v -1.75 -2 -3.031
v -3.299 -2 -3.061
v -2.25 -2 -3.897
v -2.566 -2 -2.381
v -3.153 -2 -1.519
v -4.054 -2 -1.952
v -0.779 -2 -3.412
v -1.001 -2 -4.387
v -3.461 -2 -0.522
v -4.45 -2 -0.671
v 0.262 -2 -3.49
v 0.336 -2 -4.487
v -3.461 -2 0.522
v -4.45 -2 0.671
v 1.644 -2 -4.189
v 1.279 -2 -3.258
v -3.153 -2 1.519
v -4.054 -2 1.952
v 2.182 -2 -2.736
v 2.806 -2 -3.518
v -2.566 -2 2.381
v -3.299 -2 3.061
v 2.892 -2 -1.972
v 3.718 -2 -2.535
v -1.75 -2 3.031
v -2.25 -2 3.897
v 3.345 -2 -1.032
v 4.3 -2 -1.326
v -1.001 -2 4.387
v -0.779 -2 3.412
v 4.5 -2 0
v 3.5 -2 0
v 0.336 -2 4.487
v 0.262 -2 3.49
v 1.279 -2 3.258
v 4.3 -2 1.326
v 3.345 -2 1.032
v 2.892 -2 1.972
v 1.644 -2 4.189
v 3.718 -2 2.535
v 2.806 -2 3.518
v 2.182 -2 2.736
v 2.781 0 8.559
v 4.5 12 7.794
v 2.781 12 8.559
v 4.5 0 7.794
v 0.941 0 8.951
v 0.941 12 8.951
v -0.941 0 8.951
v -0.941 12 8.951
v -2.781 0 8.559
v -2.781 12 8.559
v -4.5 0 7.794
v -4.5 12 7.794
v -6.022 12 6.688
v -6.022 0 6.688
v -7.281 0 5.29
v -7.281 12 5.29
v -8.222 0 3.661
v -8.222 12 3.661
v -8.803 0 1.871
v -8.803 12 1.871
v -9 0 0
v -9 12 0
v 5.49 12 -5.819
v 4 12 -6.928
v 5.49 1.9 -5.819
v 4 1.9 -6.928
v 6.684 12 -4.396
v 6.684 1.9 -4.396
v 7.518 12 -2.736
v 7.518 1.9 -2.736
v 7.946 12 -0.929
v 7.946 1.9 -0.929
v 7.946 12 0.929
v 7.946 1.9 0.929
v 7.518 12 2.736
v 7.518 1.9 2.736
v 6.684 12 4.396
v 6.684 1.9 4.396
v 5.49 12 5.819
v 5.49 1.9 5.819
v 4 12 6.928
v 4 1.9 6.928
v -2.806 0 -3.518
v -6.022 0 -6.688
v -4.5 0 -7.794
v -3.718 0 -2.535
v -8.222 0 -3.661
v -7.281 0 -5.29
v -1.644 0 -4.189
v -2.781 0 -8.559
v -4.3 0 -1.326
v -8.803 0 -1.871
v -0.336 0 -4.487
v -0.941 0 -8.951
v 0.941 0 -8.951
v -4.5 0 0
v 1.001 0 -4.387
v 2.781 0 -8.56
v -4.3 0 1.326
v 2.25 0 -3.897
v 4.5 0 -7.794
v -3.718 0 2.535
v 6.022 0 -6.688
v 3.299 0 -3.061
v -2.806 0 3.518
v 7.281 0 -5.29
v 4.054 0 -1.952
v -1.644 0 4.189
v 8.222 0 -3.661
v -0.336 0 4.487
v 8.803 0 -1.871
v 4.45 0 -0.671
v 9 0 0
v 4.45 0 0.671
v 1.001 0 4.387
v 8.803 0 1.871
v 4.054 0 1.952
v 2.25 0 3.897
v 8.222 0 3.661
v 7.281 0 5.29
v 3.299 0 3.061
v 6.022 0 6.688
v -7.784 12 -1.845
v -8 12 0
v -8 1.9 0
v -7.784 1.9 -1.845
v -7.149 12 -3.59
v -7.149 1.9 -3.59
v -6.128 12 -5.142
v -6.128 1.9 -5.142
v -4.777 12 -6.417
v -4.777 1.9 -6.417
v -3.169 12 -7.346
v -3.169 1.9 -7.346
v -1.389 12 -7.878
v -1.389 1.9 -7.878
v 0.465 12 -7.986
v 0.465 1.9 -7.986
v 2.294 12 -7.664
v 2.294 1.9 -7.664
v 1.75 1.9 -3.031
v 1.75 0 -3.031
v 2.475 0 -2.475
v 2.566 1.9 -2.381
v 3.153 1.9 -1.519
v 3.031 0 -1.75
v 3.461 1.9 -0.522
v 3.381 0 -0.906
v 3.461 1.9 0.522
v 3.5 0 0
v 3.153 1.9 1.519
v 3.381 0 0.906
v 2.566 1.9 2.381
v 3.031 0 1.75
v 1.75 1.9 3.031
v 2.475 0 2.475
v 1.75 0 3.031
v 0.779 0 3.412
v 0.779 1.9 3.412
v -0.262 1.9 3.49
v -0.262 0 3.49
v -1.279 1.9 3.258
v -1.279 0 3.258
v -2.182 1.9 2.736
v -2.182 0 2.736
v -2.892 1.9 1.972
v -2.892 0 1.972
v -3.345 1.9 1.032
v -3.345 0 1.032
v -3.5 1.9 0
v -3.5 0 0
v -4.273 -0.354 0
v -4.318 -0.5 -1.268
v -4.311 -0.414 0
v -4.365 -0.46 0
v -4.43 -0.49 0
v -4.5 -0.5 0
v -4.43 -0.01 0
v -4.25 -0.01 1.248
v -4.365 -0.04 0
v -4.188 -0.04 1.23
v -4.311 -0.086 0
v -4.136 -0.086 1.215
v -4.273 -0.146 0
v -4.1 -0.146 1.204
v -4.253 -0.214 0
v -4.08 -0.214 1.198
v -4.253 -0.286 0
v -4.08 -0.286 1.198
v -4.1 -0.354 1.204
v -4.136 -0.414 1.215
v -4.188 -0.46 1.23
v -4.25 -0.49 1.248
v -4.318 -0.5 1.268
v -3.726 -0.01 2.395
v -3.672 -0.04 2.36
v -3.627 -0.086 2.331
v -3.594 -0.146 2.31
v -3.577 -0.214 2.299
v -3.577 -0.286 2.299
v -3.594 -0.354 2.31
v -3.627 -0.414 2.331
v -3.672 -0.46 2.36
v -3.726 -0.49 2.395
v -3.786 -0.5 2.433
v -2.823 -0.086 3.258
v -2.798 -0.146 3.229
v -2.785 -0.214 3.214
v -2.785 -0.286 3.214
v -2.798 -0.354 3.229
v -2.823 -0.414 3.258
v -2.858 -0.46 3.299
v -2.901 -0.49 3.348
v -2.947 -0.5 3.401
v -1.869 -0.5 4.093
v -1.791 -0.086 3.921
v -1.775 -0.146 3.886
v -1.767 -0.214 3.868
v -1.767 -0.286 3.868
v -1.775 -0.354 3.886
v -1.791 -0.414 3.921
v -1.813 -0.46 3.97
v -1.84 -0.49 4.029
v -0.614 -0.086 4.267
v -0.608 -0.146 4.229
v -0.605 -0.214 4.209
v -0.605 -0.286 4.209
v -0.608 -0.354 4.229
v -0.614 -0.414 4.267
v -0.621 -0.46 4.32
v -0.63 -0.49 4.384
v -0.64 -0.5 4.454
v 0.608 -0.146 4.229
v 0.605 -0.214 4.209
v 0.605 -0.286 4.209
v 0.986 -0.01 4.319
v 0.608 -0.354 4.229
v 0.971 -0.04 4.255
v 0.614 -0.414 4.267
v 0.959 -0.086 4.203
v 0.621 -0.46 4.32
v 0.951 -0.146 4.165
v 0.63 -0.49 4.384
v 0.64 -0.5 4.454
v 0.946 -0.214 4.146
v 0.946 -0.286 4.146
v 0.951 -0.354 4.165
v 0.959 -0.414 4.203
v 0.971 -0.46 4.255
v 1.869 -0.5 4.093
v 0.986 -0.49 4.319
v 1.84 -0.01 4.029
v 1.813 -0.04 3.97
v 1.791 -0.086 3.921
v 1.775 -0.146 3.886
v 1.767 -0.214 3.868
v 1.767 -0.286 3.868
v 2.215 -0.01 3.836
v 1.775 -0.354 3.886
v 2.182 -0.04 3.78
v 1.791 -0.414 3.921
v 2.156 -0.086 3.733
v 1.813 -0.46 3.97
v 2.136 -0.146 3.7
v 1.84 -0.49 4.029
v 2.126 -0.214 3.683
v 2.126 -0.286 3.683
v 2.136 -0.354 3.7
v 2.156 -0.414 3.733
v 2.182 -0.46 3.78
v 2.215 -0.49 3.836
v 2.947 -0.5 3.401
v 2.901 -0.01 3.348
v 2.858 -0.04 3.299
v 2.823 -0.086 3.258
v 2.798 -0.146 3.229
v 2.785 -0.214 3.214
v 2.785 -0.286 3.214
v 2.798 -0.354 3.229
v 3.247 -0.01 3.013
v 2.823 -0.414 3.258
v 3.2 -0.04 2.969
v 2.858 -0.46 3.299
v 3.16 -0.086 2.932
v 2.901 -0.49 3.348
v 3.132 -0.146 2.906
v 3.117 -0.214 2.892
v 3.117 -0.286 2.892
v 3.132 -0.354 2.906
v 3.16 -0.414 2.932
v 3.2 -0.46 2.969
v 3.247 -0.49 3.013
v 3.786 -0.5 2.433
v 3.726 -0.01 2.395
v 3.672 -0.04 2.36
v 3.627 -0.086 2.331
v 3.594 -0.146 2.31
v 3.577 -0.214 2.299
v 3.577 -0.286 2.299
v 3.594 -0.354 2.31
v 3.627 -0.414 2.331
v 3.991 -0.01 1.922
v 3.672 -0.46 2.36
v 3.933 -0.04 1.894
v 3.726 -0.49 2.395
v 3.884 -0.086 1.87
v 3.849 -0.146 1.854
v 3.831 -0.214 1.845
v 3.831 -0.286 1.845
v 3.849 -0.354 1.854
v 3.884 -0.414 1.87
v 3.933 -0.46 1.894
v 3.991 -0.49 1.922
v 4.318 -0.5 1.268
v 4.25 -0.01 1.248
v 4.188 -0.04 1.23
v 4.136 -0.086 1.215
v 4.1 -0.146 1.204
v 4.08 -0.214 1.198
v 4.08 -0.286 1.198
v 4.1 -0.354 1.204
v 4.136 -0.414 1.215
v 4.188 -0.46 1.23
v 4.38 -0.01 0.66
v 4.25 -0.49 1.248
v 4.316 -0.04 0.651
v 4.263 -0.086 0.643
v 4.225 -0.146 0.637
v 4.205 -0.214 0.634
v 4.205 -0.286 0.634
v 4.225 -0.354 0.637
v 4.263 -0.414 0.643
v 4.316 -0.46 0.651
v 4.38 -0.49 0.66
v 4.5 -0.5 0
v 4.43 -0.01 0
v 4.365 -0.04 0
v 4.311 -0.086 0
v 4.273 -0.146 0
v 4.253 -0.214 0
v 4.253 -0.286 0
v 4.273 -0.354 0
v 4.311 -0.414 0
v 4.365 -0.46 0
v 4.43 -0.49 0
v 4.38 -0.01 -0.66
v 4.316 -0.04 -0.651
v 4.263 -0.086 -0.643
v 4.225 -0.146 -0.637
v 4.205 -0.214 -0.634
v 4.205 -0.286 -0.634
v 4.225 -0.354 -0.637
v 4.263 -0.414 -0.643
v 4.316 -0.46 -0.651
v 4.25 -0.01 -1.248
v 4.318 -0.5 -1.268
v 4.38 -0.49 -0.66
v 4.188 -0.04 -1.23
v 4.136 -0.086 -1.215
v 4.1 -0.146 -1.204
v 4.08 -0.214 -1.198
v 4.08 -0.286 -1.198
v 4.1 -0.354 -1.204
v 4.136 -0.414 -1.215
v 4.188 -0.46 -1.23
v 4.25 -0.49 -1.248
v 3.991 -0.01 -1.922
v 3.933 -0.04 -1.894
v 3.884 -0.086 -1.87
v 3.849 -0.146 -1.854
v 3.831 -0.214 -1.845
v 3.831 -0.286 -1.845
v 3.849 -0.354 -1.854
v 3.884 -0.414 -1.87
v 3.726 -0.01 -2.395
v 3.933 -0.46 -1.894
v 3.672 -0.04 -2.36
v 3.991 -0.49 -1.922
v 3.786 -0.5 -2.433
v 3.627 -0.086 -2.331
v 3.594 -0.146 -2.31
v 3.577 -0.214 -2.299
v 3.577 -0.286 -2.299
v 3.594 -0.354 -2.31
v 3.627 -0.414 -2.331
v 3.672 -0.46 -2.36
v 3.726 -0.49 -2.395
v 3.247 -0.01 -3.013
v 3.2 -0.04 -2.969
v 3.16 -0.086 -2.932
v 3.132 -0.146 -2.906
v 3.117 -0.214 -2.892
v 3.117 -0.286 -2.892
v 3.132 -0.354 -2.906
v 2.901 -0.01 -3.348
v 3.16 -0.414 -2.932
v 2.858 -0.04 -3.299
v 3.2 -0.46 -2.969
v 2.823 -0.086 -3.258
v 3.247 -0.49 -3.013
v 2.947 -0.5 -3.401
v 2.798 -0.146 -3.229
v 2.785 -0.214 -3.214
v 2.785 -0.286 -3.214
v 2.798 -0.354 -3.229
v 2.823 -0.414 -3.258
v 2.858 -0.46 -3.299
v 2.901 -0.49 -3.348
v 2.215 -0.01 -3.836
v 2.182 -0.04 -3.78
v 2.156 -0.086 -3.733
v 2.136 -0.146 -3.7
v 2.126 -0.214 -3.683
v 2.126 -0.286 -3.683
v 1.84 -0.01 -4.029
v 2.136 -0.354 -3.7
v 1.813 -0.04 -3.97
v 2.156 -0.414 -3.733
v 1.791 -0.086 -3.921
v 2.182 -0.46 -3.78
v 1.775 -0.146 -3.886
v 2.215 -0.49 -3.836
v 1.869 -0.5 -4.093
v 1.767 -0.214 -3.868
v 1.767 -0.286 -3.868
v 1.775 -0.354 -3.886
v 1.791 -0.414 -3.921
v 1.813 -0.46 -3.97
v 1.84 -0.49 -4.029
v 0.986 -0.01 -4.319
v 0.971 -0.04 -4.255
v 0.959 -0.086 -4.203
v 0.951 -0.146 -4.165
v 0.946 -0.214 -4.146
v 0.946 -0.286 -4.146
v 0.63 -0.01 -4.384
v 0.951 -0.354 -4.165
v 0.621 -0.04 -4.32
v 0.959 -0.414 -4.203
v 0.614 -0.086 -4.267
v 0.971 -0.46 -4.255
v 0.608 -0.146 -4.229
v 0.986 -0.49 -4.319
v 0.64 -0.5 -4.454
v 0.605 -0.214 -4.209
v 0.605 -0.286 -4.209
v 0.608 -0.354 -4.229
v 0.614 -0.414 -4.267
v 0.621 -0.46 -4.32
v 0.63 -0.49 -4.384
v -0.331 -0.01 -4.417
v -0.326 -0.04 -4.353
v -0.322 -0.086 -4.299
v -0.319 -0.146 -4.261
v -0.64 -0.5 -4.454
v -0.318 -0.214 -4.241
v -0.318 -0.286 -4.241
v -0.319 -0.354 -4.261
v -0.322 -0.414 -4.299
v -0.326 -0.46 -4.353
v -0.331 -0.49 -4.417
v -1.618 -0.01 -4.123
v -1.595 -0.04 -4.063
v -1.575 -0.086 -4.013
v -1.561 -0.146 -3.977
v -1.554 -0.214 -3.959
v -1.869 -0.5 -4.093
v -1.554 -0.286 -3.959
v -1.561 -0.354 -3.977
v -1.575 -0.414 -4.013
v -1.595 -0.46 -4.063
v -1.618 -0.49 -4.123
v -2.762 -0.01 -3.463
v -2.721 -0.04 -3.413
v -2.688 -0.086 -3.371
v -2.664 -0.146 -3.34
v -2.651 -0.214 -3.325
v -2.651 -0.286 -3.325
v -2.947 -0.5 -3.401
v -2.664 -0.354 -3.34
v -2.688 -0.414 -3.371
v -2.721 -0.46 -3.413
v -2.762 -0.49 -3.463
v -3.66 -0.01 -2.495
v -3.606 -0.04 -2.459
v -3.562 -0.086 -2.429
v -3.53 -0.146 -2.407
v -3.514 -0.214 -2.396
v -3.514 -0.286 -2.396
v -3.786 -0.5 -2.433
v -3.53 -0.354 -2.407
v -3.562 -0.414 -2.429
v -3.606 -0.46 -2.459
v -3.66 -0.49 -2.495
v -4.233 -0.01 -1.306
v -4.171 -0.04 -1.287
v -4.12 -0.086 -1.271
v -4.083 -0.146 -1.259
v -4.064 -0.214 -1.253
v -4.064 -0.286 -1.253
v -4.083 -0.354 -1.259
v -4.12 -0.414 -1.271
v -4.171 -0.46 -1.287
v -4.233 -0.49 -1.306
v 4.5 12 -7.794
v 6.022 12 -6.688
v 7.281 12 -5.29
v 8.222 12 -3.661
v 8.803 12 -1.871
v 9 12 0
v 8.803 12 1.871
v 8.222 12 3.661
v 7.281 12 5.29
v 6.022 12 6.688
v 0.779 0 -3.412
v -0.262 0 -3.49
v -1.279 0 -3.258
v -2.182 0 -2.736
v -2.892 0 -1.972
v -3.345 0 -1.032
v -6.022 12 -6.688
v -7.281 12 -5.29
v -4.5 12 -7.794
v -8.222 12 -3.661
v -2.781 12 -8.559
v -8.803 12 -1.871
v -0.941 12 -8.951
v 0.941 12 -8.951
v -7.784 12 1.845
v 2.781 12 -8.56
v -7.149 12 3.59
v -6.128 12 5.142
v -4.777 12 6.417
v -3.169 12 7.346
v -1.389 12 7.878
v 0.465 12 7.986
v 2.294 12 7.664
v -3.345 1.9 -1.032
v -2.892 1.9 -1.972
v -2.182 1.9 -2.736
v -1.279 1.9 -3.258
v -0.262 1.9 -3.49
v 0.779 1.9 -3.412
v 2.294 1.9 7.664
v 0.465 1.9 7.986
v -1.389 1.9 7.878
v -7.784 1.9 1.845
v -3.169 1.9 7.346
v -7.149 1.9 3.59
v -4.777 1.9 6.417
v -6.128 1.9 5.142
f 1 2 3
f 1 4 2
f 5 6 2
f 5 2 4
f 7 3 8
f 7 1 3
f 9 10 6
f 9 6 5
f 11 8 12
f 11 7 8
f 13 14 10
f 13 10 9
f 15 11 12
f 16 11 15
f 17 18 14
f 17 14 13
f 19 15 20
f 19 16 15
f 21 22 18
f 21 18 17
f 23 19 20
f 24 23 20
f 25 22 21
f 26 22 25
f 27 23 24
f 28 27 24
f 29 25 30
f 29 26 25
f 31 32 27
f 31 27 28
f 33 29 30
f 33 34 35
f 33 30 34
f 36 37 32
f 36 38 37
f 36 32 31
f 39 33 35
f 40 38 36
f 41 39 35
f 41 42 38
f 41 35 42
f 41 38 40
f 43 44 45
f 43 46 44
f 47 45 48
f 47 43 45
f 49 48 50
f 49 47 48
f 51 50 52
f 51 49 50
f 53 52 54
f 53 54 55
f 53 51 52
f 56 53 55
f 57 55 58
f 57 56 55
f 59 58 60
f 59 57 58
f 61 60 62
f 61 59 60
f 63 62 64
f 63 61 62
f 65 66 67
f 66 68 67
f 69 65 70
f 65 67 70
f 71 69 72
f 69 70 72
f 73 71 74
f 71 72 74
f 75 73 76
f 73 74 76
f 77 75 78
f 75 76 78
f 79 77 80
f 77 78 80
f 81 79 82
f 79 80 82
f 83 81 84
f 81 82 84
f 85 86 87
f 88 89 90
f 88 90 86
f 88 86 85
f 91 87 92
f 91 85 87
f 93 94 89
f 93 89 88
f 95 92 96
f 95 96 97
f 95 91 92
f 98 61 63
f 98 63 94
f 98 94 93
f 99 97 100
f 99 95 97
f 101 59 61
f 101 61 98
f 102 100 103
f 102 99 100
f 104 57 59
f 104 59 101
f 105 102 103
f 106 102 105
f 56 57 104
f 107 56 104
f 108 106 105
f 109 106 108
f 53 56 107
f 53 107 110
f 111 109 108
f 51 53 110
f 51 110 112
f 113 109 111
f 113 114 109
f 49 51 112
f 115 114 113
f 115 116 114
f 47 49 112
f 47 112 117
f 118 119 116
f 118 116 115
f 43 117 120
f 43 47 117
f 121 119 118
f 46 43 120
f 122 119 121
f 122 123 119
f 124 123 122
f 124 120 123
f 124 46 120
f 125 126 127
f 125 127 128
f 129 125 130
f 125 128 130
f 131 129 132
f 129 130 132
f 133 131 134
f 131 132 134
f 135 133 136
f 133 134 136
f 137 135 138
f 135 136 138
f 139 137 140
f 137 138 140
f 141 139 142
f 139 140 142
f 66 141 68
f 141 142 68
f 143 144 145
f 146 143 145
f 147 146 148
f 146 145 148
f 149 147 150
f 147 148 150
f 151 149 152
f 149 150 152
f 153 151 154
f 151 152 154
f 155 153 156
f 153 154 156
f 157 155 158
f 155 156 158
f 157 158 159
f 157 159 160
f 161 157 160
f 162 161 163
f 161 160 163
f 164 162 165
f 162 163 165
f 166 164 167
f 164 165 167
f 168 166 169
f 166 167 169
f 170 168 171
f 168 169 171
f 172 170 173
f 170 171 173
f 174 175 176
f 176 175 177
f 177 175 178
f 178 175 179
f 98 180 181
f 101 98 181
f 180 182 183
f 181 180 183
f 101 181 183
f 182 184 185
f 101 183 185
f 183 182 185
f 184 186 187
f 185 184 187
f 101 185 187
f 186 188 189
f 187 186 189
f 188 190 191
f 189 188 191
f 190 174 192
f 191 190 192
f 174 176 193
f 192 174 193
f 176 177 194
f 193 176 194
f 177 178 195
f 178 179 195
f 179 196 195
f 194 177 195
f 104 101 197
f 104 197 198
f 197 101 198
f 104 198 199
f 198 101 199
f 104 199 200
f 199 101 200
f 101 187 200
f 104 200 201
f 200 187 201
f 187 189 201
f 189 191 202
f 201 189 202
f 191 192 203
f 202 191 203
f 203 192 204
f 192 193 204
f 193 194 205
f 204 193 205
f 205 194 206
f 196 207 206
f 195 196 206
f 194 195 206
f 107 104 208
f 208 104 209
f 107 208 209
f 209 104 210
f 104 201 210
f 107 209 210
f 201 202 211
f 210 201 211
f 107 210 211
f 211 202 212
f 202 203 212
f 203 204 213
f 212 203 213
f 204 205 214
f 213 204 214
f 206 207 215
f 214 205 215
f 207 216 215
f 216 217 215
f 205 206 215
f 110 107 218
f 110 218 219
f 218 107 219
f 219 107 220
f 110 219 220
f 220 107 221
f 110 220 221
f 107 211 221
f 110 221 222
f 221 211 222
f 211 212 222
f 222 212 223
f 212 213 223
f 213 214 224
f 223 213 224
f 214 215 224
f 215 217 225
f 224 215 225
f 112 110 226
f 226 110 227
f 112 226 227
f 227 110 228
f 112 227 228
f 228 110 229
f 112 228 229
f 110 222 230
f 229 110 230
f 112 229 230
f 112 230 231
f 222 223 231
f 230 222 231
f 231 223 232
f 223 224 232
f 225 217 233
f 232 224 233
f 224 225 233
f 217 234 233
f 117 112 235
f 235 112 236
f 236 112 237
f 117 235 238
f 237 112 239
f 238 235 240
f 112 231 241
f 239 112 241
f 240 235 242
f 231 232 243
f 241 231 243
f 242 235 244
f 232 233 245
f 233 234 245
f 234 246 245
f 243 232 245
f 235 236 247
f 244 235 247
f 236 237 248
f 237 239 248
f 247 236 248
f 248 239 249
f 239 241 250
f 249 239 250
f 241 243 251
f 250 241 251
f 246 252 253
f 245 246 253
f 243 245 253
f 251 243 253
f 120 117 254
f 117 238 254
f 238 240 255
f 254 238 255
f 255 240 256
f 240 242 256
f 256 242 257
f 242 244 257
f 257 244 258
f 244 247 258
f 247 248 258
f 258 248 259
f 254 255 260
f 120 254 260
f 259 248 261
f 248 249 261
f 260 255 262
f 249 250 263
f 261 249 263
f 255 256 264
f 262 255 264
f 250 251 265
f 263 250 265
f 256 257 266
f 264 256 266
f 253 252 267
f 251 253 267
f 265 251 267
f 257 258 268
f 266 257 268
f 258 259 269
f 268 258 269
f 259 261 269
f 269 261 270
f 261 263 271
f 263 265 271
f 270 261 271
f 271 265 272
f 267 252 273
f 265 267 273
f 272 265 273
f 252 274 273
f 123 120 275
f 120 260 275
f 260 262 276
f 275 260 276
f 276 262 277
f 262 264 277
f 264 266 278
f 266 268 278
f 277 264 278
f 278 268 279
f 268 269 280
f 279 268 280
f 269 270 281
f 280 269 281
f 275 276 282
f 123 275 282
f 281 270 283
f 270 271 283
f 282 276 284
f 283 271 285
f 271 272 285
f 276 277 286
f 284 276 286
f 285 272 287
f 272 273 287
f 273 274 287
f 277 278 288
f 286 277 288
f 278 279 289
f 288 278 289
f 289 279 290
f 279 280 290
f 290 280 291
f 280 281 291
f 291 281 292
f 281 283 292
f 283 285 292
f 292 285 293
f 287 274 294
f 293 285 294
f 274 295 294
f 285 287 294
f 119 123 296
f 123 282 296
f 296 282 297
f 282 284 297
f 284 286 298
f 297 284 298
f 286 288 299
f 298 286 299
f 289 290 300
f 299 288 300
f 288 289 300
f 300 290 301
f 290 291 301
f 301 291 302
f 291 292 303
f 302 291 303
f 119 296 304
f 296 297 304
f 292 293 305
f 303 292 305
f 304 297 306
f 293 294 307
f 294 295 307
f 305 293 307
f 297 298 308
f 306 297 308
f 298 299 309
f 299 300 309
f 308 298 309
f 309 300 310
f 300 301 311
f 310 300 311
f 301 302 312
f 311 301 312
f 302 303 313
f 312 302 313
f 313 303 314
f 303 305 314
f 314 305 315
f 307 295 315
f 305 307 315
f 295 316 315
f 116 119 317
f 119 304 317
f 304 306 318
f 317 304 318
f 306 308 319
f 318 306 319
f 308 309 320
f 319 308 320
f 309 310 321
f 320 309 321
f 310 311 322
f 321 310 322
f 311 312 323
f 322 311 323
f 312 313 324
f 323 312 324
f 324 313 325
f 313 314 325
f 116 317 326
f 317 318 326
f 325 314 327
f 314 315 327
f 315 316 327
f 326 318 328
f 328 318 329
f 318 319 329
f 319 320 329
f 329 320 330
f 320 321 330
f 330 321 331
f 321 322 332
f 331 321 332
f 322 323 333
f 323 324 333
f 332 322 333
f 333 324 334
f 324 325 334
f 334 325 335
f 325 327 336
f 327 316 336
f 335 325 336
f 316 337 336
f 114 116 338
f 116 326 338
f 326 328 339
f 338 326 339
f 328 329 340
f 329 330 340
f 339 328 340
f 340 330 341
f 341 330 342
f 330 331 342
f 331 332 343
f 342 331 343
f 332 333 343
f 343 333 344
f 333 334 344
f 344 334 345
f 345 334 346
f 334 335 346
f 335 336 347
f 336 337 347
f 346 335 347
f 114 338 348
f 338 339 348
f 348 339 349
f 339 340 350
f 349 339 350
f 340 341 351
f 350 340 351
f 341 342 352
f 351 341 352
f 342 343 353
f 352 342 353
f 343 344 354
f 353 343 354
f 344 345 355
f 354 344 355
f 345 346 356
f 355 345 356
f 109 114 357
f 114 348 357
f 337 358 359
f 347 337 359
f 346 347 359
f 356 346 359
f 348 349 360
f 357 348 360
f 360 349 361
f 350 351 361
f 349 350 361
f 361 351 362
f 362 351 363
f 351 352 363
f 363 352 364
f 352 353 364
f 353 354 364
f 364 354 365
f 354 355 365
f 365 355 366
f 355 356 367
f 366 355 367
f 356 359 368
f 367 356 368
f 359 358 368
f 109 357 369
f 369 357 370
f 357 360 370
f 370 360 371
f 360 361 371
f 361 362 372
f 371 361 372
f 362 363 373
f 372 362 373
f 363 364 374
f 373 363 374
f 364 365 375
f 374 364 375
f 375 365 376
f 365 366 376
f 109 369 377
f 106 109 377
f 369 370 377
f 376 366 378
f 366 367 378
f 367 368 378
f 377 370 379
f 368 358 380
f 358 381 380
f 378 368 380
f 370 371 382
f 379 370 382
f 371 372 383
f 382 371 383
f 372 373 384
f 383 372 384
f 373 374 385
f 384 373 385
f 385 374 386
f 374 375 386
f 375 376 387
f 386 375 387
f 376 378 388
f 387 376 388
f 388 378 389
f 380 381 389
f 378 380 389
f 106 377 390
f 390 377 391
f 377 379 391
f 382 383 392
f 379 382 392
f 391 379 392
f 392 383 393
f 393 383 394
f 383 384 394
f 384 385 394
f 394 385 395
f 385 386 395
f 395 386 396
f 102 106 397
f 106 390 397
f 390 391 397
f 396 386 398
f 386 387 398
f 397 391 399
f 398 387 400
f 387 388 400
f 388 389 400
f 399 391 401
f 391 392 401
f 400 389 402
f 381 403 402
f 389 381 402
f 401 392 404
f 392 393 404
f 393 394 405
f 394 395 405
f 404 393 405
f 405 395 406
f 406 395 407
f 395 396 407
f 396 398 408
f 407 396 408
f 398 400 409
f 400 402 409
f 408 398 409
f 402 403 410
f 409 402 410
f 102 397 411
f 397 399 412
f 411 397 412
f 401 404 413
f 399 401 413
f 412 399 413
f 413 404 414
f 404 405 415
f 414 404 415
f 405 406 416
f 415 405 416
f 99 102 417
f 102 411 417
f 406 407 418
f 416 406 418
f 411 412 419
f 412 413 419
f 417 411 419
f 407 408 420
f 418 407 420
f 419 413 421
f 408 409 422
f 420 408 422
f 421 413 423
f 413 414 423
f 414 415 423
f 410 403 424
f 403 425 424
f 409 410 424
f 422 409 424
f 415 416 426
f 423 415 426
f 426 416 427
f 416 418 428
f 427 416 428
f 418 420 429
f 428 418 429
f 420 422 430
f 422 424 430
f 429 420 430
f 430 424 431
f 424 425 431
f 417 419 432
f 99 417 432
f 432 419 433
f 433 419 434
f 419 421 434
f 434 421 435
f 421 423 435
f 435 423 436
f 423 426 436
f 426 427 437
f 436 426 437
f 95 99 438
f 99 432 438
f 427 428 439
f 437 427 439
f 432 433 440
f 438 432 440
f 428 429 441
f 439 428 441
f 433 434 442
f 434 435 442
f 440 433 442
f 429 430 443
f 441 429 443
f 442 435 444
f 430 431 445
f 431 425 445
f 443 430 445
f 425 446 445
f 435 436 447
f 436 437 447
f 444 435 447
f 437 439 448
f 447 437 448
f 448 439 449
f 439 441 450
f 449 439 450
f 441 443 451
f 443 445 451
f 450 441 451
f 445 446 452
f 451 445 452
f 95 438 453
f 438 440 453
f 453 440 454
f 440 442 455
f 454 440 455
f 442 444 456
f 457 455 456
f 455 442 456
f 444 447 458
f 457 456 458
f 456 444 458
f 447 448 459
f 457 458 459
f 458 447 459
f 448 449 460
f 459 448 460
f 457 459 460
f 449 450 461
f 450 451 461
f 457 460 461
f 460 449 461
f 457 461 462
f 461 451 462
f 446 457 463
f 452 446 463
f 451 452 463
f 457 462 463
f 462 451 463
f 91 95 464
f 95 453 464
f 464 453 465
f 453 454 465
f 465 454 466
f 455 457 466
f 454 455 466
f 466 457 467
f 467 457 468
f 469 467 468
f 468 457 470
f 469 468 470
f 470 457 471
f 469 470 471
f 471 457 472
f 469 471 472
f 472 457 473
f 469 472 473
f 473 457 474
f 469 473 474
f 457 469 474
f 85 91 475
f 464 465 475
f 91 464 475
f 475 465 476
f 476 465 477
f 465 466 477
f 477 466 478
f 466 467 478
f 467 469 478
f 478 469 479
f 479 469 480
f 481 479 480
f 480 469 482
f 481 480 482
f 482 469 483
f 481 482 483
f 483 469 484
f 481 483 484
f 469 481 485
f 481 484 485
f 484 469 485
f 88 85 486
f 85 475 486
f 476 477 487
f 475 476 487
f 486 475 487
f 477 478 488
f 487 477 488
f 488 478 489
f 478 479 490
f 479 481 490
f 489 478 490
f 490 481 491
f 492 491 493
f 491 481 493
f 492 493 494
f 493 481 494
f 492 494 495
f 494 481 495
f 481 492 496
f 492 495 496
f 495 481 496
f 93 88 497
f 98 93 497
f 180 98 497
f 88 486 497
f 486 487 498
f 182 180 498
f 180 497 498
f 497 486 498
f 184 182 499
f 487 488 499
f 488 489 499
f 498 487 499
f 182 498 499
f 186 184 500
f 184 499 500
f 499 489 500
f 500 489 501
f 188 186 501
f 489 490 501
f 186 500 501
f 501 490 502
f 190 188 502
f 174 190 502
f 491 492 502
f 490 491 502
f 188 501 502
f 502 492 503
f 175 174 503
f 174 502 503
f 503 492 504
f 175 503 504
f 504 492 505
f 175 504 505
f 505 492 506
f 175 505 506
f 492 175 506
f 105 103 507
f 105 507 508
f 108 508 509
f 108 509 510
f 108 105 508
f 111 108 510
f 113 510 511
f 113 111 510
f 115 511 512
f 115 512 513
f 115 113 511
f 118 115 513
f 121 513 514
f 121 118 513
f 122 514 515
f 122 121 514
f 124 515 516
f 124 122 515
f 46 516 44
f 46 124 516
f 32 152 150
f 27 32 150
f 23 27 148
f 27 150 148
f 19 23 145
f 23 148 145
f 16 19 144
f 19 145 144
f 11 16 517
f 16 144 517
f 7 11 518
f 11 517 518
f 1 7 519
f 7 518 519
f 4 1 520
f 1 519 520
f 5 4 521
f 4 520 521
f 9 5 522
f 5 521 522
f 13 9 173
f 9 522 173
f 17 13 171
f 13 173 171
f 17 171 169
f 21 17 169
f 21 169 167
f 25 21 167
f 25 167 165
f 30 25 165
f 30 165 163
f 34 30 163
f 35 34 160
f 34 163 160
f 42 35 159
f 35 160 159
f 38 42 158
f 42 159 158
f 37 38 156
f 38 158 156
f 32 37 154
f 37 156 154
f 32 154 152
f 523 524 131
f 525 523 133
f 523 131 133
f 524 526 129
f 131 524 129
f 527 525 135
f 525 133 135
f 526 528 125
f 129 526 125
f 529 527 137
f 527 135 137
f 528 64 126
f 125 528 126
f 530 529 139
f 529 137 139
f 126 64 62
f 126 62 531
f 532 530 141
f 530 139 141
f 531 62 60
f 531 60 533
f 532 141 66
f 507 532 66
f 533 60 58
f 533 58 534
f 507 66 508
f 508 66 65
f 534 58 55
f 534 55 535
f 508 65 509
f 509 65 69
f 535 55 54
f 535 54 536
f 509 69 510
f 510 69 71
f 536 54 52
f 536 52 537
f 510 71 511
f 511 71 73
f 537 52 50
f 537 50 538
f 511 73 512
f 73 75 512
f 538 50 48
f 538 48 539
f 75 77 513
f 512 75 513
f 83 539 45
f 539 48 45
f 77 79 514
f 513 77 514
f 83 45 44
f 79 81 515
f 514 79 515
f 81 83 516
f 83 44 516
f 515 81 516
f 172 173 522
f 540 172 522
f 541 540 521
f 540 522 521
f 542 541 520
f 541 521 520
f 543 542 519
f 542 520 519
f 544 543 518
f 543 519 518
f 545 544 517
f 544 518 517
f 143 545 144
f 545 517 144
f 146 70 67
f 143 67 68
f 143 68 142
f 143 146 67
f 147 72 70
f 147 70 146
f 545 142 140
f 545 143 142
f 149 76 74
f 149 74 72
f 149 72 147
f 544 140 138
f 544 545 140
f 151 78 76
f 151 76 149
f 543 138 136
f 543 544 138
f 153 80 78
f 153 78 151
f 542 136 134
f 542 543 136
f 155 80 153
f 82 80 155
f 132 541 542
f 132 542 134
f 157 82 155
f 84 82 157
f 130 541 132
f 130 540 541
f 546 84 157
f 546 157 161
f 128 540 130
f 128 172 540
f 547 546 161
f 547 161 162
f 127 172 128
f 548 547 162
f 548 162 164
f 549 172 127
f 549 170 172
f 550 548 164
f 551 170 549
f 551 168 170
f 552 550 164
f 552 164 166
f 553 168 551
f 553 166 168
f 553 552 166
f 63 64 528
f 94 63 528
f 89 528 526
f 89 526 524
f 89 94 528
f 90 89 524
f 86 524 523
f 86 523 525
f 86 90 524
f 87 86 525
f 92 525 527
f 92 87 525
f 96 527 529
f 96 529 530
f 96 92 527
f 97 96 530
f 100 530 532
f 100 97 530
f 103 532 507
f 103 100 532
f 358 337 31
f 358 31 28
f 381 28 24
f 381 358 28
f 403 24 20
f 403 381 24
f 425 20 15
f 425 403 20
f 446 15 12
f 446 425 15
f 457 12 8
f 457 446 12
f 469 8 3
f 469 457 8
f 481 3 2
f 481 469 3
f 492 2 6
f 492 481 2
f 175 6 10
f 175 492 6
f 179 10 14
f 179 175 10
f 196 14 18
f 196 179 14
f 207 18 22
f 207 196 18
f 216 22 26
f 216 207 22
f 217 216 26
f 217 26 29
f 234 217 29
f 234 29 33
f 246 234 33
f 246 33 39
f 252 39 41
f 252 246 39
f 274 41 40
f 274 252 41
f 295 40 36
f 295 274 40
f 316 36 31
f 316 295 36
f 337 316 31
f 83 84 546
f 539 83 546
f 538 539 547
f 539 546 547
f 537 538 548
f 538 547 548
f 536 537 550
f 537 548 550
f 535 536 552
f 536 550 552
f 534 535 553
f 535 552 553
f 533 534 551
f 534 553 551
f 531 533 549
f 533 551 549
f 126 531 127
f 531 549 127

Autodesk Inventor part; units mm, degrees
ref_plane "XZ Plane" through (0, 0, 0) normal (0, 1, 0) x (-1, 0, 0)
ref_plane "XY Plane" through (0, 0, 0) normal (0, 0, 1) x (1, 0, 0)
sketch "スケッチ6" plane through (0, 0, 0) normal (0, 1, 0) x (-1, 0, 0)
  arc A0 (9, 0) -> (-4.5, 7.7942) centre (0, 0) ccw
  line L0 (0, 0) -> (-4.5, 7.7942) construction
  line L1 (0, 0) -> (9, 0) construction
  arc A1 (8, 0) -> (-4, 6.9282) centre (0, 0) ccw
  line L2 (0, 0) -> (-4, 6.9282) construction
  line L3 (0, 0) -> (8, 0) construction
  arc A2 (7, 0) -> (-3.5, 6.0622) centre (0, 0) ccw
  line L4 (0, 0) -> (-3.5, 6.0622) construction
  line L5 (0, 0) -> (7, 0) construction
  arc A3 (4.7, 0) -> (-2.35, 4.0703) centre (0, 0) ccw
  arc A4 (3.5, 0) -> (-1.75, 3.0311) centre (0, 0) ccw
  line L6 (4.5041, 1.3429) -> (6.7082, 2)
  arc A5 (10.9533, 0) -> (5.4767, 9.4859) centre (0, 0) ccw
  line L7 (0, 0) -> (5.4767, 9.4859) construction
  line L8 (0, 0) -> (10.9533, 0) construction
  line L9 (-1.0891, 4.5721) -> (-1.6221, 6.8095)
  line L10 (0, 0) -> (9, 0)
  line L11 (0, 0) -> (-4.5, 7.7942)
  point P0 (-1.6221, 6.8095)
  point P1 (-4, 6.9282)
  point P2 (-1.75, 3.0311)
  dimension "d33" = 9
  dimension "d34" = 120
  dimension "d35" = 120
  dimension "d36" = 1
  dimension "d37" = 120
  dimension "d38" = 2
  dimension "d39" = 4.7
  dimension "d40" = 3.5
  dimension "d41" = 2
  dimension "d42" = 60
extrude "押し出し6" add sketch "スケッチ6" along normal blind 1.9 contours L10 A2 L11 A1 | L10 A3 L6 A2 | A2 L9 A3 L11 | L6 A3 L9 A2 | L10 A4 L11 A3
sketch "スケッチ7" plane through (0, 0, 0) normal (0, -1, 0) x (1, 0, 0)
  arc A0 (4, 6.9282) -> (-8, 0) centre (0, 0) ccw projected
  arc A1 (4.5, 7.7942) -> (-9, 0) centre (0, 0) ccw
  arc A2 (4, 6.9282) -> (-8, 0) centre (0, 0) ccw
  line L0 (0, 0) -> (4, 6.9282) construction
  line L1 (0, 0) -> (-8, 0) construction
  line L2 (4.5, 7.7942) -> (4, 6.9282)
  line L3 (-9, 0) -> (-8, 0)
  dimension "d45" = 120
  dimension "d46" = 9
  dimension "d47" = 8
  dimension "d48" = 120
extrude "押し出し7" add sketch "スケッチ7" against normal blind 12
pattern_circular "円形状パターン1" count 3 over 360 about axis through (0, 0, 0) along (0, 1, 0)
sketch "スケッチ9" plane through (0, 0, 0) normal (0, -1, 0) x (1, 0, 0)
  circle A0 centre (0, 0) radius 4.5
  circle A1 centre (0, 0) radius 3.5 projected
  dimension "d62" = 9
extrude "押し出し9" add sketch "スケッチ9" along normal blind 2
sketch "スケッチ11" plane through (0, 0, 0) normal (1, 0, 0) x (0, 1, 0)
  line L0 (0, 4.5) -> (-2, 4.5) projected
  circle A0 centre (-0.25, 4.5) radius 0.25
  line L1 (0, 9) -> (0, -9) projected
  point P0 (0, 0)
  point P1 (-0.5, 4.5)
  dimension "d73" = 0.5
sketch3d "3D スケッチ1"
  arc A0 (4.5, 0, 0) -> (0, 0, -4.5) centre (0, 0, 0) ccw
  arc A1 (0, 0, -4.5) -> (-4.5, 0, 0) centre (0, 0, 0) ccw
  arc A2 (-4.5, 0, 0) -> (0, 0, 4.5) centre (0, 0, 0) ccw
  arc A3 (0, 0, 4.5) -> (4.5, 0, 0) centre (0, 0, 0) ccw
sweep "スイープ1" cut profiles "スケッチ11" path "3D スケッチ1" picked at (-0.194, 4.3148) contours A0 L0
properties part number "wheel" material "ABS プラスチック"
